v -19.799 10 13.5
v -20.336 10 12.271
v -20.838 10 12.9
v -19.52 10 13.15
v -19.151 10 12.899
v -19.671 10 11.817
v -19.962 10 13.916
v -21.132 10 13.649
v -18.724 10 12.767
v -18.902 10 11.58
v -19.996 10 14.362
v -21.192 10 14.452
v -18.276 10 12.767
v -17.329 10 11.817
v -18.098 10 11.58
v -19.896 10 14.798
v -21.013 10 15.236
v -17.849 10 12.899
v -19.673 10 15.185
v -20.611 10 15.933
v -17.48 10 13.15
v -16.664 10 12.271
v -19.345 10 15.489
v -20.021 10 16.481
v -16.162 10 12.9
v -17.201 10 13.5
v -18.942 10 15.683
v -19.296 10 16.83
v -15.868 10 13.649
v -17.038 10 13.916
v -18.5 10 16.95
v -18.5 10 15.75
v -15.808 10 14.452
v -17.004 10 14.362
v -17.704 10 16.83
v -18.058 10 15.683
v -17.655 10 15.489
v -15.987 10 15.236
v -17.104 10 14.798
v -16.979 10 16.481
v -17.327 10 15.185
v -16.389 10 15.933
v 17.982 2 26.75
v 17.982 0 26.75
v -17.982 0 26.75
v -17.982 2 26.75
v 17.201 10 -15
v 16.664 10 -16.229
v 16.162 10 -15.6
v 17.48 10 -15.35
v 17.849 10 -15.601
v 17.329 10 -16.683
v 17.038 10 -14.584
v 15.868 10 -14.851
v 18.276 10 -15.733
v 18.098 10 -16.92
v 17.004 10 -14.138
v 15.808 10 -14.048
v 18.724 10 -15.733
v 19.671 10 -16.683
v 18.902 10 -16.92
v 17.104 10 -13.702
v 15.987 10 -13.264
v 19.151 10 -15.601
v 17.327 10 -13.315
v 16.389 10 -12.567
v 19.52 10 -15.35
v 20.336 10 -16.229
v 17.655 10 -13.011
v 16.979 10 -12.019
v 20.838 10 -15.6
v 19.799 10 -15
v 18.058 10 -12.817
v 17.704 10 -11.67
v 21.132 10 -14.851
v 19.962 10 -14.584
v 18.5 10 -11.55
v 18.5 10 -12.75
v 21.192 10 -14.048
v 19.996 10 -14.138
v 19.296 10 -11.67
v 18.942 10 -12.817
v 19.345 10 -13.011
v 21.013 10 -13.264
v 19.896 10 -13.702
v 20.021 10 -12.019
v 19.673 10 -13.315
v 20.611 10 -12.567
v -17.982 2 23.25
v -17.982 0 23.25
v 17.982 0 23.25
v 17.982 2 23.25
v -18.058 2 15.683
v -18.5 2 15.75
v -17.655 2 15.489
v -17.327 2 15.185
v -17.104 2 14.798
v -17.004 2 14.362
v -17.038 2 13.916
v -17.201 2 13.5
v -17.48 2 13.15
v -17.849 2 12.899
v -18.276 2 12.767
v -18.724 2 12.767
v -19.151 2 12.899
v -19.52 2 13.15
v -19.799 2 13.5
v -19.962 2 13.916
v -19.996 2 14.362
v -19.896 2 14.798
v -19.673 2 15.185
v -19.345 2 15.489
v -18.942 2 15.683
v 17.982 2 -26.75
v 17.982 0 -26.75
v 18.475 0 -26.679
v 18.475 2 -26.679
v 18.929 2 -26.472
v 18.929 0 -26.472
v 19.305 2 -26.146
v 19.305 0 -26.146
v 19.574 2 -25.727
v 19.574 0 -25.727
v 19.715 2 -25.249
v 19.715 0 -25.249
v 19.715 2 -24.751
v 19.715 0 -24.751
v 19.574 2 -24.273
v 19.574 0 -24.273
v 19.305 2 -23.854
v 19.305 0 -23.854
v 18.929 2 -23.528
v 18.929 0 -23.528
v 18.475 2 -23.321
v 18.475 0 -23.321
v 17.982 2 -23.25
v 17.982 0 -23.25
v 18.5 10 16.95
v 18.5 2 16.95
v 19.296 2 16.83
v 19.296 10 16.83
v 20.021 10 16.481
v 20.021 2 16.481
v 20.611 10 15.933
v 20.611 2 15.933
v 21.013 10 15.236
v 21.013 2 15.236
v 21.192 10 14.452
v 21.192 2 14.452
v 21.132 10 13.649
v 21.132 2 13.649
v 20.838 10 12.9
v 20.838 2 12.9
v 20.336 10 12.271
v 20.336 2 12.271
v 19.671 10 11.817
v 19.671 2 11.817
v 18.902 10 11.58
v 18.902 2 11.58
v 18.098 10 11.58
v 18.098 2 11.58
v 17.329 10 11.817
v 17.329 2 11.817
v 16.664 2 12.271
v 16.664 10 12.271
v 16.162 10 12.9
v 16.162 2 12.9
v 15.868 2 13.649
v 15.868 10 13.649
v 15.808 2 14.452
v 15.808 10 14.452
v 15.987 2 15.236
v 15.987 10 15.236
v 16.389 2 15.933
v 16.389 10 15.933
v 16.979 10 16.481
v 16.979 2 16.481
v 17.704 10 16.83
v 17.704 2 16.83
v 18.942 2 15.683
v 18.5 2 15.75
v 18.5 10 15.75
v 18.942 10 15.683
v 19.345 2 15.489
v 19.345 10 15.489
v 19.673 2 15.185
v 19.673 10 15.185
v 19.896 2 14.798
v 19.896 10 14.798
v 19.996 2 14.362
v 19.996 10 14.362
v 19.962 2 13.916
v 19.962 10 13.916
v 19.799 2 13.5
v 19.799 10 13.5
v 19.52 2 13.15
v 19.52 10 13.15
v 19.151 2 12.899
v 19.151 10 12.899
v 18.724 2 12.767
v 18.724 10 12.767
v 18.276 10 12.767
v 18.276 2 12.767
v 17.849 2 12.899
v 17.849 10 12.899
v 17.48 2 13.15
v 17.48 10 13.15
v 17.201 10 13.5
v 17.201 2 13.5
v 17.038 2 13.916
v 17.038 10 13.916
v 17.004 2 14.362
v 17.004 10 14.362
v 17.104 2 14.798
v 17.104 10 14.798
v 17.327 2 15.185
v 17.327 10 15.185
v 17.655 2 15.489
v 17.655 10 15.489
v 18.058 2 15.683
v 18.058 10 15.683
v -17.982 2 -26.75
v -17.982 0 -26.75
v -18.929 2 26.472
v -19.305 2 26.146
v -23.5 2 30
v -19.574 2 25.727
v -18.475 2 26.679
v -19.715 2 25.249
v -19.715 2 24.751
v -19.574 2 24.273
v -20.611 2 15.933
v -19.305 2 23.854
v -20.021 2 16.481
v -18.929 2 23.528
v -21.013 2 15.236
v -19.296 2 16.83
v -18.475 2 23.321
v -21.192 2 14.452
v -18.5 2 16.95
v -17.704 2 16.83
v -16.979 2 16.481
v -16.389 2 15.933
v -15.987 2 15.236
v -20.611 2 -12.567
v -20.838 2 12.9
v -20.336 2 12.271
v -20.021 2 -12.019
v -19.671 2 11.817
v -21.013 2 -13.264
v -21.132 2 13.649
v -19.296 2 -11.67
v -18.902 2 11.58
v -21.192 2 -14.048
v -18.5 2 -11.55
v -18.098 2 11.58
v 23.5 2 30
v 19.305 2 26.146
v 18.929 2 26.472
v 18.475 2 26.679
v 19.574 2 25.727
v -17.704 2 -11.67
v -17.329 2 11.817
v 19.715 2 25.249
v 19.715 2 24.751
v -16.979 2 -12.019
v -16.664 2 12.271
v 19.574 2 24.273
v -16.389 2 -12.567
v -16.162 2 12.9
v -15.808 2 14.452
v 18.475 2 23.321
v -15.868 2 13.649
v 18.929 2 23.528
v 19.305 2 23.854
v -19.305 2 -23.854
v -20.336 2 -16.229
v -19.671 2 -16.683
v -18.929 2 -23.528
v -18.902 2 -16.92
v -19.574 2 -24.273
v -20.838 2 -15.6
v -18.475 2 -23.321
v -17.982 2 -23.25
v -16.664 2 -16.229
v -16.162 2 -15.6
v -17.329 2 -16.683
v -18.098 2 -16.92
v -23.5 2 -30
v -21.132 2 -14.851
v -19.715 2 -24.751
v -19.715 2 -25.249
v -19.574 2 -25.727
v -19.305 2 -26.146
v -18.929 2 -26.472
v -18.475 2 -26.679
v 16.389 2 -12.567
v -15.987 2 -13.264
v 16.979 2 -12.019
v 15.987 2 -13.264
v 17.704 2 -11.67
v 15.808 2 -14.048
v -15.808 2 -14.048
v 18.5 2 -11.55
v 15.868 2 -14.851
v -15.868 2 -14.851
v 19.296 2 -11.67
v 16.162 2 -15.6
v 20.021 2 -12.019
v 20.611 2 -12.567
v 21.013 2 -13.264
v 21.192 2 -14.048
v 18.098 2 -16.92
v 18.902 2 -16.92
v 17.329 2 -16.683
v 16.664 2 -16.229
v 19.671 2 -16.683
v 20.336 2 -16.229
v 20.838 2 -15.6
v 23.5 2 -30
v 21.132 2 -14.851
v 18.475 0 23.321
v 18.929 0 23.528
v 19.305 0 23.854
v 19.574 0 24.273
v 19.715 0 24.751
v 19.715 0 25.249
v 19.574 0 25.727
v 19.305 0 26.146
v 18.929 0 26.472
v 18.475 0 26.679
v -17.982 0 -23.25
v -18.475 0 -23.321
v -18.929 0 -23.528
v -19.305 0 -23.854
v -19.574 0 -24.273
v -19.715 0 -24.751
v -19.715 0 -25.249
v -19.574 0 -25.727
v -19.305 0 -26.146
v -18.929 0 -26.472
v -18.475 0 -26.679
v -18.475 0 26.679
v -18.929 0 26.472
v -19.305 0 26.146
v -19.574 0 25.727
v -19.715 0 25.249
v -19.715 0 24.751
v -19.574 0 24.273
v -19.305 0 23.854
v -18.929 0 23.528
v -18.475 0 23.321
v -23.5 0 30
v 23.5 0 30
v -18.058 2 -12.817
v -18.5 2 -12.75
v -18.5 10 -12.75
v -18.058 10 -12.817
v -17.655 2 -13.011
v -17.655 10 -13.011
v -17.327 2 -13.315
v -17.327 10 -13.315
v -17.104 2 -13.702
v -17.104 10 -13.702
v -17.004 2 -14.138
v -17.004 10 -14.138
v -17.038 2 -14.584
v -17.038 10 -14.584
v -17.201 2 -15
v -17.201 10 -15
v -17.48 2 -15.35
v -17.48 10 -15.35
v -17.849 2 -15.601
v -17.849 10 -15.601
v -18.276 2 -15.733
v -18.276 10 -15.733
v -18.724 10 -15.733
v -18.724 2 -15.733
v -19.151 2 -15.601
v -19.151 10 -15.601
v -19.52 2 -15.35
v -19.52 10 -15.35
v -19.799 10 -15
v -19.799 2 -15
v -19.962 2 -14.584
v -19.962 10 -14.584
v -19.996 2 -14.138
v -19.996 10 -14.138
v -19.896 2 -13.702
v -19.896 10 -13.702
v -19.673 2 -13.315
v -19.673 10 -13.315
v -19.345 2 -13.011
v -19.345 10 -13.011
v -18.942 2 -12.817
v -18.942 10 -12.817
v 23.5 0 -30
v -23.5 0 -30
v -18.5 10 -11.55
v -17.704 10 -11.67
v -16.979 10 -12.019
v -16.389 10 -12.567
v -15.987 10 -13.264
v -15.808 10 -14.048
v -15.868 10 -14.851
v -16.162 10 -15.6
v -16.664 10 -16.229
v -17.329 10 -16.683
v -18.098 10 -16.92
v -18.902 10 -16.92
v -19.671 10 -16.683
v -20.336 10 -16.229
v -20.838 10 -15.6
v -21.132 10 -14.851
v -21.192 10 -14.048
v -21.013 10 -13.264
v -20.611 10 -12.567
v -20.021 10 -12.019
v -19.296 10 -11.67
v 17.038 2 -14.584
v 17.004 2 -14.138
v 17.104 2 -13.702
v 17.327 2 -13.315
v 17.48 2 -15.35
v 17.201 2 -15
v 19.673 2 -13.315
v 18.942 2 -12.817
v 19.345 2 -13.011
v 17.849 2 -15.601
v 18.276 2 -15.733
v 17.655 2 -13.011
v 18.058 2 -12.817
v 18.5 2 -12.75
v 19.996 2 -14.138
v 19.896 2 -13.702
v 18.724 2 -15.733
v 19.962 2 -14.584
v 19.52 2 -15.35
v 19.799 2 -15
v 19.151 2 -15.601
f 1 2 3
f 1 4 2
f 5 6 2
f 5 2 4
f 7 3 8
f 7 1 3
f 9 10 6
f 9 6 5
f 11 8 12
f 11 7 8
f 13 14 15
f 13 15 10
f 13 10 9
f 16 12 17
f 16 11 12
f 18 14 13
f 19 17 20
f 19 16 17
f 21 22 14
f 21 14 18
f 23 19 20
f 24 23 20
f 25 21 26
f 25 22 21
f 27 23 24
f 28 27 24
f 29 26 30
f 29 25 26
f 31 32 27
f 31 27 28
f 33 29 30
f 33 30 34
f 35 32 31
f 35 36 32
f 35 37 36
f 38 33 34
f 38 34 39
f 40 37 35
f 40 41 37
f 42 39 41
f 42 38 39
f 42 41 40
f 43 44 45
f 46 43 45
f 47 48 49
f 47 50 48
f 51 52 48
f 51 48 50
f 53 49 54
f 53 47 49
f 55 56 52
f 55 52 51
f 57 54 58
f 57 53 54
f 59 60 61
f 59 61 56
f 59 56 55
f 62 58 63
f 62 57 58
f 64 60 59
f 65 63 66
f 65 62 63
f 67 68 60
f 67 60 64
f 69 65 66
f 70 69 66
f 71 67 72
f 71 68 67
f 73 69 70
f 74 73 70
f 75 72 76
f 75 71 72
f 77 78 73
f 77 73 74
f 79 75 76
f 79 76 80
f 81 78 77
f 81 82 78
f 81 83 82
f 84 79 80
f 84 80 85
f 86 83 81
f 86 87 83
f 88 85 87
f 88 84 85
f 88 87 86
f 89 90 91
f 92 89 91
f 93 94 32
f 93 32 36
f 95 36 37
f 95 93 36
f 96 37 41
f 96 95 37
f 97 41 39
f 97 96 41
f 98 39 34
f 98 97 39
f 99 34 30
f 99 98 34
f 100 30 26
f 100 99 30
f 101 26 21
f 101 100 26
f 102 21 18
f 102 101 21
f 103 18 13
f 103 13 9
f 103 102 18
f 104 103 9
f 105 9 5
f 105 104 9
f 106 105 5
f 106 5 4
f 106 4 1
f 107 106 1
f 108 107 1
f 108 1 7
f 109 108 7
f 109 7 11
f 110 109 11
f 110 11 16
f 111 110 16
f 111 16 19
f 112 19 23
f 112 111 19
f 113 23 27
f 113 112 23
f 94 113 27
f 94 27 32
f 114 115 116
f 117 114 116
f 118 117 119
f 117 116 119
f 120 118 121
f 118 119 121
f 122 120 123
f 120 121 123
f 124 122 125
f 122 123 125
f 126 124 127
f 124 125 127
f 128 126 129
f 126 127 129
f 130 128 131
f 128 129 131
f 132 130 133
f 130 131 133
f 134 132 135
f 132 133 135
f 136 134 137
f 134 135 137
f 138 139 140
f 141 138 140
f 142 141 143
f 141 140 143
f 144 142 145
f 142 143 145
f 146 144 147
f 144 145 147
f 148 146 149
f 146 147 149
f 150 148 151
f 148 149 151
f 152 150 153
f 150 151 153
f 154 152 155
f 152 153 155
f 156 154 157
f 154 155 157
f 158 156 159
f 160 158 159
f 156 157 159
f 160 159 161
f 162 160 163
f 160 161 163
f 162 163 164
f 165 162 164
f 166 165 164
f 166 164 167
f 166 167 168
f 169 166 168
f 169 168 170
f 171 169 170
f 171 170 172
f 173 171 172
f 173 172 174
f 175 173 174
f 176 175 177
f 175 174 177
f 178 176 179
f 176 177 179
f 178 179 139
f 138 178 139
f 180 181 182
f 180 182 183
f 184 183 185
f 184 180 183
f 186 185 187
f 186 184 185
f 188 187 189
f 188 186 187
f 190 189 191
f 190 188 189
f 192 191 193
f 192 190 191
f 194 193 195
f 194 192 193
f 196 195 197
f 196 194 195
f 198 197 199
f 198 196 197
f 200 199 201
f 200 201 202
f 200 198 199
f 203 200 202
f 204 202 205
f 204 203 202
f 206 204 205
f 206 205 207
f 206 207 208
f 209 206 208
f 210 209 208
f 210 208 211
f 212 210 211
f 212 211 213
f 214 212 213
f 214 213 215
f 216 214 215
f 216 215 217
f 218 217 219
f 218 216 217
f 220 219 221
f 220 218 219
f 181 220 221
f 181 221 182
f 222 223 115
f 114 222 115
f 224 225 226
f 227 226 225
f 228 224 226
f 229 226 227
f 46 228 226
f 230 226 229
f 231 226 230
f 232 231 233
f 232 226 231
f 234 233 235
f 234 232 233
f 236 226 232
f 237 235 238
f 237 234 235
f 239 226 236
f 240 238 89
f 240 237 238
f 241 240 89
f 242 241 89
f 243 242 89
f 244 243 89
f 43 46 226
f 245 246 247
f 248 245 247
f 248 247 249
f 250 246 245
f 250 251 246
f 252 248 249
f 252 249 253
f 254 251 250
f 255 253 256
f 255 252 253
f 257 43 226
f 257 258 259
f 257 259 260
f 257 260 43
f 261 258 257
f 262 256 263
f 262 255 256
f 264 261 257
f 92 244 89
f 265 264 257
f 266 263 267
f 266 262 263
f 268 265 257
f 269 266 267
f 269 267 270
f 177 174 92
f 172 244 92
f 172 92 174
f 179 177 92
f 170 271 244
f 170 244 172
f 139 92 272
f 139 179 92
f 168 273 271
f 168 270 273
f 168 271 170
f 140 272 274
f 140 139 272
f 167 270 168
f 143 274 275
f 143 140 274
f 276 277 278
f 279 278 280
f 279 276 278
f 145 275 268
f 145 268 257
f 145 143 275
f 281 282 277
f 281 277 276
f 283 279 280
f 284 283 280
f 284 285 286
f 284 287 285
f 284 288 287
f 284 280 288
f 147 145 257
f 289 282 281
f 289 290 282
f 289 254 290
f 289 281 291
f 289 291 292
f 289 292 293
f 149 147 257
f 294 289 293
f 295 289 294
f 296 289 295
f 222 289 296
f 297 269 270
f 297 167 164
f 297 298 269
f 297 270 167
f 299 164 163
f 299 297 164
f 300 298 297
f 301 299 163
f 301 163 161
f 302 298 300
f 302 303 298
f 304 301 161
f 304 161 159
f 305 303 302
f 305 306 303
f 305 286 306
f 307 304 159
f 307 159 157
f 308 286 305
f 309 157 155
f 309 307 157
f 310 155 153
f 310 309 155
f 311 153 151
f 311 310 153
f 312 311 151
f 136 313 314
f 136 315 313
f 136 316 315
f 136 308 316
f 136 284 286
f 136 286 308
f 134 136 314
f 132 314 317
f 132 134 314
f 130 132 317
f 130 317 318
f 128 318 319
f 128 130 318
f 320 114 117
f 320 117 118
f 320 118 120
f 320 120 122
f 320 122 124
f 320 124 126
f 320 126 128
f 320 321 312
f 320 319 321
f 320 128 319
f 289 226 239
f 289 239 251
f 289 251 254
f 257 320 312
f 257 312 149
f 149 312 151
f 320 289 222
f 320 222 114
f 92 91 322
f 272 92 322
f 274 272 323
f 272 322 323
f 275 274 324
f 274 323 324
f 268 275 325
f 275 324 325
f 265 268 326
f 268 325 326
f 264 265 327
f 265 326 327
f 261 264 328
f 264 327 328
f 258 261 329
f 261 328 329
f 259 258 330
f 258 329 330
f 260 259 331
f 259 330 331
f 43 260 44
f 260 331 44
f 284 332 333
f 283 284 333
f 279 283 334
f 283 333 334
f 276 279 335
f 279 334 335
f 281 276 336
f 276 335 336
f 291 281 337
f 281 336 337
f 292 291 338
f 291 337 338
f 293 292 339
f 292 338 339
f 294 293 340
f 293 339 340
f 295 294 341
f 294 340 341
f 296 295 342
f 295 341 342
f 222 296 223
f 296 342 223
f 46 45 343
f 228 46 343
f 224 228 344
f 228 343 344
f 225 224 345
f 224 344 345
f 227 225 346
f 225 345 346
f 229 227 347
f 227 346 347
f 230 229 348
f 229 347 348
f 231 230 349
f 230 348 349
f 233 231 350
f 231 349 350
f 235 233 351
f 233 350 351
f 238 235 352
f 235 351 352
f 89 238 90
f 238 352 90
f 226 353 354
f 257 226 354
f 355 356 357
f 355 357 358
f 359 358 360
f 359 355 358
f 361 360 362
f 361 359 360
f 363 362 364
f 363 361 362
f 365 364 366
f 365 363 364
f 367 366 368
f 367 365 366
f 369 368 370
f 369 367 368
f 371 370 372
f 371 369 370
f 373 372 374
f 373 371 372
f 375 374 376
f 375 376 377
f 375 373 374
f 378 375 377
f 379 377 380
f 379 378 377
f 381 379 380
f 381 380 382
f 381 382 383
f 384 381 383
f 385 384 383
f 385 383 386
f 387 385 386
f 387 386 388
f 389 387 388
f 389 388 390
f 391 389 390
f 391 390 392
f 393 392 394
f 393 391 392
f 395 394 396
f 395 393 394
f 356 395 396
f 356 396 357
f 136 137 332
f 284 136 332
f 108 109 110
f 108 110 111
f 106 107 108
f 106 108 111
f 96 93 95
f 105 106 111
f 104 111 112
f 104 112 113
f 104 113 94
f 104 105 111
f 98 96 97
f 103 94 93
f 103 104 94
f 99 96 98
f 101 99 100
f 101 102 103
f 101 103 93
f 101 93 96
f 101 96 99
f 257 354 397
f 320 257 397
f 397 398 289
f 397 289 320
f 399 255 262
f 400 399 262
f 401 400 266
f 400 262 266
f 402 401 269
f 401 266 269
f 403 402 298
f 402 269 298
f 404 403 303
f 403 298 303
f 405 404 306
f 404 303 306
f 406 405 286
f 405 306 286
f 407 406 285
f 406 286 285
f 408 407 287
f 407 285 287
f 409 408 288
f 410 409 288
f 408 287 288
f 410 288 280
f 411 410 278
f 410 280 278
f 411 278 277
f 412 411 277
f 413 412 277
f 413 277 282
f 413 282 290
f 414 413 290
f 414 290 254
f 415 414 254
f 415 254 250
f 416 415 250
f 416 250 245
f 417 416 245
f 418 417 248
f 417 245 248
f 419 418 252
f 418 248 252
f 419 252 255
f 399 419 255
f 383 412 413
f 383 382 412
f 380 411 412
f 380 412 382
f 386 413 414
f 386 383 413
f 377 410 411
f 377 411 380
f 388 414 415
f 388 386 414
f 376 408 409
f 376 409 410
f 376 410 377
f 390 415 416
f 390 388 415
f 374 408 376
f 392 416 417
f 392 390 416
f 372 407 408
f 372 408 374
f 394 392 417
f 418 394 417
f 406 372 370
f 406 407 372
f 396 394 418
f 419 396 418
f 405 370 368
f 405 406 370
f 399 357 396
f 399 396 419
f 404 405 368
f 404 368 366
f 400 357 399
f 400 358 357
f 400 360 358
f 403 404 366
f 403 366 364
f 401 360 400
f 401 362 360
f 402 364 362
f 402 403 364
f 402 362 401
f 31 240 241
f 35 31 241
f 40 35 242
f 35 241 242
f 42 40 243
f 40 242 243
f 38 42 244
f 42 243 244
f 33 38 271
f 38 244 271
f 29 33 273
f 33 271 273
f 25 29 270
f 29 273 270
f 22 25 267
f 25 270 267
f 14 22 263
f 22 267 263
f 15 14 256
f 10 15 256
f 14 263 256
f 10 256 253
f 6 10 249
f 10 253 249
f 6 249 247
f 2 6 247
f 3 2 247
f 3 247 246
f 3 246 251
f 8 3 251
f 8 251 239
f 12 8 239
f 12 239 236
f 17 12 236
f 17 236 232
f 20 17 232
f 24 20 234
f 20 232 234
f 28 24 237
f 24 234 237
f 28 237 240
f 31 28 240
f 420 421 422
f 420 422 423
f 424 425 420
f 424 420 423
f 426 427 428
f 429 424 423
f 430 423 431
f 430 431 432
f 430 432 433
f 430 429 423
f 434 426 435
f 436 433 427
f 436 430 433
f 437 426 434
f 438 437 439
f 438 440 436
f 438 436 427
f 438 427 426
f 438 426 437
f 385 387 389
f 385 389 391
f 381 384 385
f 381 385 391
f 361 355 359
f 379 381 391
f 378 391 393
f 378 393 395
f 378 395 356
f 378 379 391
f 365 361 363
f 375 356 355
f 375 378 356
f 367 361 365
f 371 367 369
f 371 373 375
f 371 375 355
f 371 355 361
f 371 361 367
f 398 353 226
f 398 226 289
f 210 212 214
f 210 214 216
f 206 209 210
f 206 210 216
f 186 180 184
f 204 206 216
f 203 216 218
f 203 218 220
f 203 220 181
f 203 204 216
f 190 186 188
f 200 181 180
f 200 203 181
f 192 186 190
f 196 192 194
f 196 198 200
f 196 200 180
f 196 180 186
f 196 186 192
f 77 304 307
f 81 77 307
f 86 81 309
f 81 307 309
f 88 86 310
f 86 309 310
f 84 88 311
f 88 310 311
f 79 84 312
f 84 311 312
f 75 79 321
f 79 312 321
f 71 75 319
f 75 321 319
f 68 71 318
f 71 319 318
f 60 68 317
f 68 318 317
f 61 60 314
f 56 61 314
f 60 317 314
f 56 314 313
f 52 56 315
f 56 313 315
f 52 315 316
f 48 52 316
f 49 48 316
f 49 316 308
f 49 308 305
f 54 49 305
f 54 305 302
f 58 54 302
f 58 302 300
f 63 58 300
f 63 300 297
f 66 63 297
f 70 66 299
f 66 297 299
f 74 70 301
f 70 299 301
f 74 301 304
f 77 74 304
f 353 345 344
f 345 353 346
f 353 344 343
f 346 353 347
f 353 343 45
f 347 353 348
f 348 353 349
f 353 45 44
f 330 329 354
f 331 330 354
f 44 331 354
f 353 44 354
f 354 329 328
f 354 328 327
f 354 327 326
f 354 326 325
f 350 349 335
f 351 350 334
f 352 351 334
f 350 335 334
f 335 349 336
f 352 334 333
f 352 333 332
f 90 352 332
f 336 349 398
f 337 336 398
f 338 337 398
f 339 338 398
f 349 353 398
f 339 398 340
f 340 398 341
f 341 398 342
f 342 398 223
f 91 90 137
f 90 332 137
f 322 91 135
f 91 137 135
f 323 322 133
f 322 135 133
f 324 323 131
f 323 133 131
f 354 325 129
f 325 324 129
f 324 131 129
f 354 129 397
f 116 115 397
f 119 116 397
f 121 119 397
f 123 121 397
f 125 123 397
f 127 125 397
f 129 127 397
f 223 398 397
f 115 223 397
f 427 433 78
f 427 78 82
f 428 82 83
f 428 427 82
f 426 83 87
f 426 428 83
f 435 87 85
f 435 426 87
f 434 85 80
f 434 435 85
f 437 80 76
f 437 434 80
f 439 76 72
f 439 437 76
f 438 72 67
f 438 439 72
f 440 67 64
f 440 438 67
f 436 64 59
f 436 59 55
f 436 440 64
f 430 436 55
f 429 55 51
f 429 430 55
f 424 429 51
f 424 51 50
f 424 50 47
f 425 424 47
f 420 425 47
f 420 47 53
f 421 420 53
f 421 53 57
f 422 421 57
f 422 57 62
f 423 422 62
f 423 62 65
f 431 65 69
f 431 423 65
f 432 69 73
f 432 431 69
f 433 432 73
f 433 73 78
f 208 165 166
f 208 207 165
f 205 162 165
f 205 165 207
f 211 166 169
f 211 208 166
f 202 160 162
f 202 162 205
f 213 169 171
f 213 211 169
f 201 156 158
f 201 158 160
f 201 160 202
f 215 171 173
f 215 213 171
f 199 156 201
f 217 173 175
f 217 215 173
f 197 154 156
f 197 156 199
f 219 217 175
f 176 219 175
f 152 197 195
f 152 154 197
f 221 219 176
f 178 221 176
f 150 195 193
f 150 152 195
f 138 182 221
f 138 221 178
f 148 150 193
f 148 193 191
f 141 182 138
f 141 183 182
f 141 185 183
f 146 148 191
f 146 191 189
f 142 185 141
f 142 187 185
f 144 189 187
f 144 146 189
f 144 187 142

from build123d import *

# Parameters (mm, degrees)
SKETCH1_W           = 47
SKETCH1_H           = 60
BOSS_EXTRUDE1_DEPTH = 2
SKETCH2_R           = 2.7
SKETCH2_R_2         = 1.5
BOSS_EXTRUDE2_DEPTH = 8


with BuildPart() as part:
    # Sketch1 → Boss-Extrude1 (new body)
    with BuildSketch(Plane(origin=(0, 0, 0), x_dir=(1, 0, 0), z_dir=(0, 1, 0))):
        Rectangle(SKETCH1_W, SKETCH1_H)
        with BuildLine():
            Line((-17.98240987, 26.75), (17.98240987, 26.75))
            ThreePointArc((17.98240987, 26.75), (19.73240987, 25), (17.98240987, 23.25))
            Line((17.98240987, 23.25), (-17.98240987, 23.25))
            ThreePointArc((-17.98240987, 23.25), (-19.73240987, 25), (-17.98240987, 26.75))
        make_face(mode=Mode.SUBTRACT)
        with BuildLine():
            Line((-17.98240987, -23.25), (17.98240987, -23.25))
            ThreePointArc((17.98240987, -23.25), (19.73240987, -25), (17.98240987, -26.75))
            Line((17.98240987, -26.75), (-17.98240987, -26.75))
            ThreePointArc((-17.98240987, -26.75), (-19.73240987, -25), (-17.98240987, -23.25))
        make_face(mode=Mode.SUBTRACT)
    extrude(amount=BOSS_EXTRUDE1_DEPTH)

    # Sketch2 → Boss-Extrude2 (add)
    # profile 1 of 4: a face of its own
    with BuildSketch(Plane(origin=(0, 2, 0), x_dir=(1, 0, 0), z_dir=(0, 1, 0))):
        with Locations(Location((-18.5, 14.25, 0), (0, 0, 270))):
            Circle(SKETCH2_R)
        with Locations(Location((-18.5, 14.25, 0), (0, 0, 270))):
            Circle(SKETCH2_R_2, mode=Mode.SUBTRACT)
    # profile 2 of 4: a face of its own
    with BuildSketch(Plane(origin=(0, 2, 0), x_dir=(1, 0, 0), z_dir=(0, 1, 0))):
        with Locations(Location((18.5, 14.25, 0), (0, 0, 270))):
            Circle(SKETCH2_R)
        with Locations(Location((18.5, 14.25, 0), (0, 0, 270))):
            Circle(SKETCH2_R_2, mode=Mode.SUBTRACT)
    # profile 3 of 4: a face of its own
    with BuildSketch(Plane(origin=(0, 2, 0), x_dir=(1, 0, 0), z_dir=(0, 1, 0))):
        with Locations(Location((18.5, -14.25, 0), (0, 0, 270))):
            Circle(SKETCH2_R)
        with Locations(Location((18.5, -14.25, 0), (0, 0, 270))):
            Circle(SKETCH2_R_2, mode=Mode.SUBTRACT)
    # profile 4 of 4: a face of its own
    with BuildSketch(Plane(origin=(0, 2, 0), x_dir=(1, 0, 0), z_dir=(0, 1, 0))):
        with Locations(Location((-18.5, -14.25, 0), (0, 0, 270))):
            Circle(SKETCH2_R)
        with Locations(Location((-18.5, -14.25, 0), (0, 0, 270))):
            Circle(SKETCH2_R_2, mode=Mode.SUBTRACT)
    extrude(amount=BOSS_EXTRUDE2_DEPTH)


solid = part.part
